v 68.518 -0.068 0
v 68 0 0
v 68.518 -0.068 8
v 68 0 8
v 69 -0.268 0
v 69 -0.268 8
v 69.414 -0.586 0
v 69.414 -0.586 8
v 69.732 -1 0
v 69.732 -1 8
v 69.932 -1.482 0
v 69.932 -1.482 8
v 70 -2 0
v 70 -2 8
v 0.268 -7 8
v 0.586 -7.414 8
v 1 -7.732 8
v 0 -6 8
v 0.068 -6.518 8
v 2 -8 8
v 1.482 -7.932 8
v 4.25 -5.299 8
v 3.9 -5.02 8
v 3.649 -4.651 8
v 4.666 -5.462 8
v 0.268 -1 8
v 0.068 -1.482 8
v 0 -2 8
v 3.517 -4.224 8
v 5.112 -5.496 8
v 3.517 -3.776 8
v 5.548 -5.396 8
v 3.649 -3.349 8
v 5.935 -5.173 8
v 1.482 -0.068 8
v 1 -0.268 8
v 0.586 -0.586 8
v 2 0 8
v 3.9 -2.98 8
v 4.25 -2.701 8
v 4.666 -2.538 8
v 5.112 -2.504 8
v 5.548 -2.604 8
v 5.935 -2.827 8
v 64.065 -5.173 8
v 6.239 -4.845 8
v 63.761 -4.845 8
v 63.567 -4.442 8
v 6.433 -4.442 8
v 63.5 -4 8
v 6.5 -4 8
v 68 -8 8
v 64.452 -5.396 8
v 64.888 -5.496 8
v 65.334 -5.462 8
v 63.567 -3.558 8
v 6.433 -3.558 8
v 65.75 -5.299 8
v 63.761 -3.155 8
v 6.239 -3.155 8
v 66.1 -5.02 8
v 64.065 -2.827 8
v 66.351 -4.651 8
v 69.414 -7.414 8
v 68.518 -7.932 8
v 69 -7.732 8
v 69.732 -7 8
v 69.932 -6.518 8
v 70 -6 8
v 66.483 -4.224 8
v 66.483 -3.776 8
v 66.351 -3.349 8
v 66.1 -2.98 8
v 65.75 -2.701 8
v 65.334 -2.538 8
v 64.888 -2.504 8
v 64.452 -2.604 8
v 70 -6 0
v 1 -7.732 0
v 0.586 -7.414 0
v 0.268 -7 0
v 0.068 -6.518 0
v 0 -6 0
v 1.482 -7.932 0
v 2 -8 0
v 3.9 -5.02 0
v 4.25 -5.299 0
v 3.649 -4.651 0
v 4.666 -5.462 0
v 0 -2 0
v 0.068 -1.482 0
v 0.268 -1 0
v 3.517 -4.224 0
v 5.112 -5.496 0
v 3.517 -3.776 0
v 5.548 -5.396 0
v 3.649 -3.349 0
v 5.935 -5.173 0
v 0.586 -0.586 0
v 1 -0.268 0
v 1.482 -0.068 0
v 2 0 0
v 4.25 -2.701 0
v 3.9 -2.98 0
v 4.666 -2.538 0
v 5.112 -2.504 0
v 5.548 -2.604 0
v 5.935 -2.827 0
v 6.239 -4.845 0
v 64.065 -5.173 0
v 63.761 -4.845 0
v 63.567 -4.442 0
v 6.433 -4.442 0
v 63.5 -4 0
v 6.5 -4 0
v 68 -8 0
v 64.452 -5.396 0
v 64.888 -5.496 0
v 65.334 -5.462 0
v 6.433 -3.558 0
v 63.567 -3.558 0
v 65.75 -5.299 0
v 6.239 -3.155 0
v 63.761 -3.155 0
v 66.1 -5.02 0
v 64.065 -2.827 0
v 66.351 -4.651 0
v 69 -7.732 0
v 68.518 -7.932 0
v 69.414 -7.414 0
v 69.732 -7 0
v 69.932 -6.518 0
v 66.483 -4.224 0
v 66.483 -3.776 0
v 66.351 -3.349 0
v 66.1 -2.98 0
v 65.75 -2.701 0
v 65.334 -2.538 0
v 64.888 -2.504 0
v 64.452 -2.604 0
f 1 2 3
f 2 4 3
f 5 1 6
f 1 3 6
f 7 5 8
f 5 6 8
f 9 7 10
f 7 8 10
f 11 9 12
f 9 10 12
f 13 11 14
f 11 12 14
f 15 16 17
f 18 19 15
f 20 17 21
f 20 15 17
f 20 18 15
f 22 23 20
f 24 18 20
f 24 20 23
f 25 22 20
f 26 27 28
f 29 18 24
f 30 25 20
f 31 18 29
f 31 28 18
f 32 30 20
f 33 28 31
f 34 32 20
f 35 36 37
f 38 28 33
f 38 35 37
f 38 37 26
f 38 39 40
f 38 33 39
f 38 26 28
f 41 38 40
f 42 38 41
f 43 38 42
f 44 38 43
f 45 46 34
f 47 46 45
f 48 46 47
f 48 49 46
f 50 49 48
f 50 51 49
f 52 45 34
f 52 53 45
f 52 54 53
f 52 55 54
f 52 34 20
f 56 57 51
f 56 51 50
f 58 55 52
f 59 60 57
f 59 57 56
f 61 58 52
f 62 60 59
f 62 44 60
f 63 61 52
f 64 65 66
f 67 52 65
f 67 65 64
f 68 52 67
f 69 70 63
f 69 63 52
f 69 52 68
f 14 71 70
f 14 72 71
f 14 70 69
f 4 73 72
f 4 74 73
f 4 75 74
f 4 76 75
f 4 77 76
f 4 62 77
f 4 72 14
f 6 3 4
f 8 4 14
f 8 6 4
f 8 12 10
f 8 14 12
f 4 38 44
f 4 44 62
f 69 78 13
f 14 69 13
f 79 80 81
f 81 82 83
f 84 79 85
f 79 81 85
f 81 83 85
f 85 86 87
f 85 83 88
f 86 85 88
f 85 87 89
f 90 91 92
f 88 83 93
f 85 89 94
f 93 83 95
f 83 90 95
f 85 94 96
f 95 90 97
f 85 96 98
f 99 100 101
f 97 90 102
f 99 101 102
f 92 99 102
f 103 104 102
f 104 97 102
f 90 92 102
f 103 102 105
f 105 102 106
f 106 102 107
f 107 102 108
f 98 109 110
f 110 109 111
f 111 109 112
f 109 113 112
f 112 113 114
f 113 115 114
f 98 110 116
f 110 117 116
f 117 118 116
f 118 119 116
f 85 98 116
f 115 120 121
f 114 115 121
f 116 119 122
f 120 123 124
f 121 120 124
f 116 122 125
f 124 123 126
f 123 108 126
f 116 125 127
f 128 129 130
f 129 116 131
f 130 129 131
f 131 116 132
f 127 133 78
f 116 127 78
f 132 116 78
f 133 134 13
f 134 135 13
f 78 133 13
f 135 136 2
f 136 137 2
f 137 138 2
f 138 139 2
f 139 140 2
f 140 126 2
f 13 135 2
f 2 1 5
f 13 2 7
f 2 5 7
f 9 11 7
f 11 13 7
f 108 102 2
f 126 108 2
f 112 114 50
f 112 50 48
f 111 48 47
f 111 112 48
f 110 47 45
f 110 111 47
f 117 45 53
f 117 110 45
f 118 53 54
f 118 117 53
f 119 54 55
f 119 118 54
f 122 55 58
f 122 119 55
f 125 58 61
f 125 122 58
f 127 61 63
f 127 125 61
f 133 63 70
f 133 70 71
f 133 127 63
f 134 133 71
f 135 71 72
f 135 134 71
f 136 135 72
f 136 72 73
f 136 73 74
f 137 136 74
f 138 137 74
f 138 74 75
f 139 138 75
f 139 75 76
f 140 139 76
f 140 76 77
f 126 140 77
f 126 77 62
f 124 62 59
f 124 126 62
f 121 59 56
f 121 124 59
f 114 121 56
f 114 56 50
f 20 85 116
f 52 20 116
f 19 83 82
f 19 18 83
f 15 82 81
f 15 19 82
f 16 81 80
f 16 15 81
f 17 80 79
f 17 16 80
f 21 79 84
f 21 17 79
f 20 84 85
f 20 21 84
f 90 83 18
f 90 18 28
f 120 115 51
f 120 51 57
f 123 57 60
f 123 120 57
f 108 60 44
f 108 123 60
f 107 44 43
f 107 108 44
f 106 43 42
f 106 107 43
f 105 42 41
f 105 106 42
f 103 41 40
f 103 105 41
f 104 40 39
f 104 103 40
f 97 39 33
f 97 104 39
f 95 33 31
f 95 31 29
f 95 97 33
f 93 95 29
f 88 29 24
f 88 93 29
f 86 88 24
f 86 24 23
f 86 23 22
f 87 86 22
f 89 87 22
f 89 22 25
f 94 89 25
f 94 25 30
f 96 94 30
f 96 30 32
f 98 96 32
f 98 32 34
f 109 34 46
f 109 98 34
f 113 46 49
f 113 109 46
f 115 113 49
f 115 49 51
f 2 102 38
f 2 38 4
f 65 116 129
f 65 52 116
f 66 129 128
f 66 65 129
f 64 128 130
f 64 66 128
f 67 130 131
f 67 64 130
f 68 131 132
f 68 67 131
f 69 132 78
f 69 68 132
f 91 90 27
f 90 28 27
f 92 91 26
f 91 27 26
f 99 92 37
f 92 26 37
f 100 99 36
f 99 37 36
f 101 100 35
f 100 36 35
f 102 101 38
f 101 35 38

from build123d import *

# Parameters (mm, degrees)
SKETCH_1_W      = 70
SKETCH_1_H      = 8
SKETCH_1_R      = 1.5
EXTRUDE_1_DEPTH = 8
FILLET_1_R      = 2


with BuildPart() as part:
    # 草图1 → 凸台-拉伸1 (new body)
    with BuildSketch(Plane.XY):
        with Locations((35, -4)):
            Rectangle(SKETCH_1_W, SKETCH_1_H)
        with Locations((5, -4)):
            Circle(SKETCH_1_R, mode=Mode.SUBTRACT)
        with Locations(Location((65, -4, 0), (0, 0, 180))):
            Circle(SKETCH_1_R, mode=Mode.SUBTRACT)
    extrude(amount=EXTRUDE_1_DEPTH)

    # 圆角1
    fillet_1_edges = [part.edges().sort_by_distance(p)[0] for p in [
        (0, 0, 4),
        (70, 0, 4),
        (70, -8, 4),
        (0, -8, 4),
    ]]
    fillet(fillet_1_edges, radius=FILLET_1_R)


solid = part.part
